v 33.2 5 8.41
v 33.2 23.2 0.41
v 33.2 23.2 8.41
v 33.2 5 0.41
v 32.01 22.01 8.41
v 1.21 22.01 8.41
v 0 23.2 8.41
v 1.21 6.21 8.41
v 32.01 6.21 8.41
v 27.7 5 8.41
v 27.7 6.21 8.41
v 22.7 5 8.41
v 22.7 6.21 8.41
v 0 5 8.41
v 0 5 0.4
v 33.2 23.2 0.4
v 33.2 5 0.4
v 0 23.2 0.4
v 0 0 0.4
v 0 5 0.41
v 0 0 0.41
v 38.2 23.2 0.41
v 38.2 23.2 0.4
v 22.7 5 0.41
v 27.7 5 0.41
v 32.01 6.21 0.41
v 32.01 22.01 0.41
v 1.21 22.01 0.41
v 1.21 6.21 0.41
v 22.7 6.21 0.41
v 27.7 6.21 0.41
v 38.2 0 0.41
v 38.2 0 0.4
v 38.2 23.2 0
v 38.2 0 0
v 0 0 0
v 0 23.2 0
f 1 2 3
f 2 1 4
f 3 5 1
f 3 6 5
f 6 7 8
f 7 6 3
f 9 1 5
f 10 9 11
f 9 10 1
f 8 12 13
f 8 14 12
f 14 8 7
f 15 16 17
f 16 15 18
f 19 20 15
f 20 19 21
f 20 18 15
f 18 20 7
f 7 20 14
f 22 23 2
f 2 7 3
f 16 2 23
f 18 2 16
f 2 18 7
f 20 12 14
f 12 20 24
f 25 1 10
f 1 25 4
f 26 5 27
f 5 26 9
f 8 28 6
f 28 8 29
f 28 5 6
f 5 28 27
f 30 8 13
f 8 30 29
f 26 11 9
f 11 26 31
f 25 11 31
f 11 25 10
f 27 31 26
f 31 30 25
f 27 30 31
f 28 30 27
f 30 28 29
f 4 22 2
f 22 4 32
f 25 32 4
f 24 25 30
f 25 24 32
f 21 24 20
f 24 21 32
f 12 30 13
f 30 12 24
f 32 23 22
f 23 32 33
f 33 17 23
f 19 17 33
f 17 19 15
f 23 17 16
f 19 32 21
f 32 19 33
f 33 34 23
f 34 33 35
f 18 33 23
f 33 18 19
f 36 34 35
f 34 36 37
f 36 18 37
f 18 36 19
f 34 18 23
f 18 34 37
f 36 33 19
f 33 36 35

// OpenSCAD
// file: ../../Base/Rotation.scad
// Fischertechnik Box Foundation
// Geometry Helpers Rotation

include <PlacementOptions.scad>

// getRotatedSpace(space, rotation=NoRotation)
// Rotates the space dependent on the specified rotation

function getRotatedSpace(space, rotation=NoRotation) = [
    (rotation == Rotate90 || rotation == Rotate270) ? space.y : space.x,
    (rotation == Rotate90 || rotation == Rotate270) ? space.x : space.y
];

// Rotates the given space around the fixed left lower corner
// space = the space the children needs as width/depth list [width,depth]
// rotation = 0 Rotate0 degrees, 1 Rotate90 degrees, 2 Rotate180 degrees, 3 Rotate270 degrees (equivalent to -90)

module RotateFix(space, rotation=NoRotation) {
    dy = (rotation == Rotate0 || rotation == Rotate270) ? 0 :
        (rotation == Rotate90) ? space.x :
        space.y;
    dx = (rotation < Rotate180) ? 0 :
        (rotation == Rotate180) ? space.x :
        space.y;
    
    translate([dx, dy, 0])
        rotate([0, 0, rotations[rotation]])
            children();
}
// file: ../../Base/Alignment.scad
// Fischertechnik Box Foundation
// Geometry Helpers Alignment

include <PlacementOptions.scad>

// getAlignedX(elementWidth, spaceWidth, align=AlignRight, offset=0)
// Gets the aligned X offset of an element with the given
// width in the given space.
// elementWidth = The width of the element to positon
// spaceWidth = The space where the element should be aligned
// align = 0 AlignLeft, 1 AlignCenter, 2 AlignRight
// offset = an optional offset from the aligned position. When
// aligned left or centered, then positive values are in X direction.
// When aligned right then positive values are in negative X direction.

function getAlignedX(elementWidth, spaceWidth, align=AlignRight, offset=0) =
    (align == AlignLeft) ?
        offset :
        ((align == AlignCenter) ?
        (spaceWidth - elementWidth)/2 + offset :
        spaceWidth - offset - elementWidth);

// getAlignedY(elementDepth, spaceDepth, align=AlignTop, offset=0)
// Gets the aligned Y offset of an element with the given
// depth in the given space.
// elementDepth = The depth of the element to positon
// spaceDepth = The space where the element should be aligned
// align = 0 AlignBottom, 1 AlignCenter, 2 AlignTop
// offset = an optional offset from the aligned position. When
// aligned bottom or centered, then positive values are in Y direction.
// When aligned top then positive values are in negative Y direction.

function getAlignedY(elementDepth, spaceDepth, align=AlignTop, offset=0) =
    (align == AlignBottom) ?
        offset :
        ((align == AlignCenter) ?
        (spaceDepth - elementDepth)/2 + offset :
        spaceDepth - offset - elementDepth);
// file: ../../Base/PlacementOptions.scad
// Fischertechnik Box Foundation
// Placement Options

// Alignment
NoAlign = 0;
AlignLeft = 1;
AlignBottom = 2;
AlignCenter = 3;
AlignRight = 4;
AlignTop = 5;

// Element rotation degree steps
rotations = [0, -90, -180, -270];

// Rotation
NoRotation = 0;
Rotate0 = 0;
Rotate90 = 1;
Rotate180 = 2;
Rotate270 = 3;

// Docking (seen from above)
NoDock = -1;
DockLeft = 0;
DockTop = 1;
DockRight = 2;
DockCorner = 2;
DockBottom = 3;

// Web corners
LowerLeft = 0;
UpperLeft = 1;
UpperRight = 2;
LowerRight = 3;

// Web position relative to corner
LeftOfCorner = 0;
RightOfCorner = 1;
// file: ../../Base/Boxes.scad
// Fischertechnik Box Foundation
// Pre-designed Boxes

use <Constants.scad>

include <PlacementOptions.scad>

box190Width = 190;
box190Depth = 130;
box130Width = 130;
box130Depth = 95;

// Values are from an original ec3 box
topBottomDifference = 1.5;
outerHeight = 40;
innerHeight = 38.2;
baseThickness = outerHeight - innerHeight;
stackExcess = 5.7;
radius = 3.5;
wallThickness = 1.5;
tolerance = 0.2;
stackOffset = innerHeight - stackExcess;

boxUsageHeight = stackOffset;
boxWallThickness = wallThickness;
boxBaseThickness = baseThickness;
boxWebWidth = 3.0;

// getBoxWallThickness()
// Gets the wall thickness of a Fischertechnik Box
function getBoxWallThickness() = boxWallThickness;

// getBoxUsageHeight()
// Gets the usable height of a Fischertechnik box
function getBoxUsageHeight() = boxUsageHeight;

// getBoxInnerHeight()
// Gets the inner height of a Fischertechnik box, including the stack excess
function getBoxInnerHeight() = innerHeight;

// getBoxBaseThickness()
// Gets the thickness of the Fischertechnik box base.
function getBoxBaseThickness() = boxBaseThickness;

// getBoxWebWidth()
// Gets the width of a box web
function getBoxWebWidth() = boxWebWidth;

// getBox190Space()
// Gets the usable inner space of a Box 190 as an x/y-list
function getBox190Space() = [
    box190Width - 2*getBoxWallThickness() - topBottomDifference, 
    box190Depth - 2*getBoxWallThickness() - topBottomDifference ];

// BoxBase(width, depth)
// Creates an empty stackable Fischertechnik compatible box
// width = Outer width of the box (190, 130, ...)
// depth = Outer depth of the box (130, 95, ...)

module BoxBase(width, depth, height=outerHeight) {    
    thinPlate = 0.01;

    innerHeight = height - baseThickness;    
    
    module BodyPlate(width, depth) {
        translate([radius, radius])
        hull() {
            w = width-2*radius;
            d = depth-2*radius;
            cube([w, d, thinPlate]);
            cylinder(thinPlate, r=radius, $fn=getFragments());
            translate([w, 0])
                cylinder(thinPlate, r=radius, $fn=getFragments());
            translate([w, d])
                cylinder(thinPlate, r=radius, $fn=getFragments());
            translate([0, d])
                cylinder(thinPlate, r=radius, $fn=getFragments());
        }
    }
    
    module Body(tolerance=tolerance) {
        hull() {
            // Bottom with tolerance to fit into the original boxes when stacked
            translate([-wallThickness+tolerance, -wallThickness+tolerance, -baseThickness])
                BodyPlate(width-topBottomDifference-2*tolerance, depth-topBottomDifference-2*tolerance);
            
            // Top
            translate([-wallThickness-topBottomDifference/2, -wallThickness-topBottomDifference/2, innerHeight-thinPlate])
                BodyPlate(width, depth);
         }
    }

    module Cutoff() {
        hull() {
            coWidth = width - 2*wallThickness;
            coDepth = depth - 2*wallThickness;
            
            // Bottom
            BodyPlate(coWidth-topBottomDifference, coDepth-topBottomDifference);

            // Top
            translate([-topBottomDifference/2, -topBottomDifference/2, innerHeight+thinPlate]) 
                BodyPlate(coWidth, coDepth);
        }
    }
    
    difference() {        
        Body();
        Cutoff();
        stackOffset = innerHeight - stackExcess;
        translate([0, 0, stackOffset + baseThickness])
            Body(tolerance=0);
    }
}

// Creates the Fischertechnik empty box 130x190 mm and places it at position 0,0
// 190x130 are the outer sizes, the inner space is slightly smaller. Use getBox190Space() to get the inner sizes.
// The box is positioned that the usable inner space is at the 0,0,0 position. The

module Box190() {
    BoxBase(box190Width, box190Depth);
}

// Gets the usable inner space of a Box 130 as an x/y-list
function getBox130Space() = [
    box130Width - 2*getBoxWallThickness() - topBottomDifference, 
    box130Depth - 2*getBoxWallThickness() - topBottomDifference ];

// Creates the Fischertechnik empty box 95x130 mm and places it at position 0,0
// 190x130 are the outer sizes, the inner space is slightly smaller. Use getBox190Space() to get the inner sizes.
// The box is positioned that the usable inner space is at the 0,0,0 position. The

module Box130() {
    BoxBase(box130Width, box130Depth);
}

// Creates a web at the specified box walls
// corner 0 = LowerLeft, 1 = UpperLeft, 2 = UpperRight, 3 = LowerRight
// side 0 = LeftOfCorner, 1 = RightOfCorner
// distance = Distance in mm from the corner
// boxSpace = inner width and depth of the box (default: Box 190)
// webWidth = length of the web (default is 3 mms)
// webThickness = thickness of the web (default is 1 mm)

module BoxWeb(corner, side, distance, boxSpace=getBox190Space(), webWidth=getBoxWebWidth(), webThickness=1.0) {
    sink = getBoxWallThickness()/2;

    width = (corner % 2 == 0) ? 
            (side == LeftOfCorner ? webWidth : webThickness) :
            (side == LeftOfCorner ? webThickness : webWidth);

    depth = (corner % 2 == 0) ? 
            (side == RightOfCorner ? webWidth : webThickness) :
            (side == RightOfCorner ? webThickness : webWidth);
    
    xDiff = corner == LowerLeft ? 
                (side == LeftOfCorner ? -sink : distance) :
            (corner == UpperLeft ?                
                (side == LeftOfCorner ? distance : -sink) :
            (corner == UpperRight ?
                (side == LeftOfCorner ? boxSpace.x-webWidth+sink : boxSpace.x-distance-webThickness) :
                (side == LeftOfCorner ? boxSpace.x-distance-webThickness: boxSpace.x-webWidth+sink)));

    yDiff = corner == LowerLeft ? 
                (side == RightOfCorner ? -sink : distance) :
            (corner == UpperLeft ?
                (side == RightOfCorner ? boxSpace.y-distance : boxSpace.y-webWidth+sink) :
            (corner == UpperRight ?
                (side == RightOfCorner ? boxSpace.y-webWidth+sink : boxSpace.y-distance) :
                (side == RightOfCorner ? distance : -sink)));
    
    translate([xDiff, yDiff, -getExcess()])
        cube([width, depth, boxUsageHeight + 2*getExcess()]);
}
// file: ../../Base/Placement.scad
// Fischertechnik Box Foundation
// Geometry Helpers Placement

use <Constants.scad>
use <Alignment.scad>
use <Rotation.scad>
use <Boxes.scad>

include <PlacementOptions.scad>

// Place(x=0, y=0, elementSpace=[0,0], alignX=AlignLeft, alignY=AlignBottom, rotation=Rotate0, boxSpace=getBox190Space())
// Places the child at the specified position
// y = Y-Position. This is a relative position when an X aligment is specified.
// x = X-Position. This is a relative position when an Y aligment is specified.
// elementSpace = space of the element to be placed [x,y]
// alignX = -1=NoAlign, 0 AlignLeft, 1 AlignCenter, 3 AlignRight (elementSpace and boxSpace required!)
// alignY = -1=NoAlign, 2 AlignBottom, 1 AlignCenter, 4 AlignTop (elementSpace and boxSpace required!)
// rotation = 0 Rotate0 0 degrees, 1 Rotate90 90 degrees, 
// 2 Rotate180 180 degrees, 3 Rotate270 270 degrees (equivalent to -90)
// boxSpace = Inner space of the box where the placement occurs [x,y] - default is Box 190x130 inner space

module Place(x=0, y=0, elementSpace=[0,0], 
  alignX=AlignLeft, alignY=AlignBottom, 
  rotation=NoRotation, boxSpace=getBox190Space()) {

    module Position(x, y, space, rotation=Rotate0) {
        translate([x, y, 0])
            RotateFix(space, rotation)
                children();
    }

    space = getRotatedSpace(elementSpace, rotation);
    alignedX = getAlignedX(space.x, boxSpace.x, alignX, x);
    alignedY = getAlignedY(space.y, boxSpace.y, alignY, y);
    Position(alignedX, alignedY, elementSpace, rotation)
        children();
}

// Center(space=getBox130Space(), elementSpace=[0,0])
// space = Space where the children is centered. For cylinder use centered=true and no elementSpace.
// elementSpace = space of the element to be centered [x,y]

module Center(space=getBox190Space(), elementSpace=[0,0]) {
    Place(elementSpace=elementSpace, boxSpace=space, alignX=AlignCenter, alignY=AlignCenter)
        children();
}

// CenterHorizontal(width=0, y=0, offset=0, space=getBox130Space())
// width = Width of the element to be placed.
// y = Y position of the element
// offset = Offset from the center position (negative will be left of the center)
// space = Space where the element is placed

module CenterHorizontal(width=0, y=0, offset=0, space=getBox190Space()) {
    Place(x=offset, y=y, elementSpace=[width, 0], boxSpace=space, alignX=AlignCenter)
        children(0);
}

// CenterVertical(depth=0, x=0, offset=0, space=getBox130Space())
// depth = Depth of the element to be placed.
// x = X position of the element
// offset = Offset from the center position (negative will be down of the center)
// space = Space where the element is placed

module CenterVertical(depth=0, x=0, offset=0, space=getBox190Space()) {
    Place(x=x, y=offset, elementSpace=[0, depth], boxSpace=space, alignY=AlignCenter)
        children(0);
}

// getIsVertical(align)
// True if the specified alignment needs a vertical orientation for a divider (AlignRight, AlignLeft)

function getIsVertical(align) = (align == AlignRight || align == AlignLeft);

// getIsHorizontal(align)
// True if the specified alignment needs a horizontal orientation for a divider (AlignTop, AlignBottom)

function getIsHorizontal(align) = (align == AlignTop || align == AlignBottom);
// file: ../../Elements/AxisClip10.scad
// Fischertechnik Box Library
// Axis for clip 10
// 31023

use <../ModelBase/Simple.scad>
use <../Base/Constants.scad>

width = 12;
depth = 12;
height = 23;
upperDiameter = 3.6;
clipHeight = 10;

// getAxisClip10Space()
// Gets the space of a frame for a clip 10 with spring ring (mot2)

function getAxisClip10Space() = [width, depth, height];

// AxisClip10(height, clipHeight)
// Axis for clip 10 with spring ring (mot2)
// height = Height of the complete axis
// clipHeight = Height of the rt for the clip (standard is 10, in mot3 its only 7)

module AxisClip10(height=height, clipHeight=clipHeight) {
    LeveledAxisWithSpace(height, height-clipHeight, getAxisClip10Space(), diameter=upperDiameter);
}

// Tests
color("lightgray")
AxisClip10();
// file: ../../Base/Constants.scad
// Fischertechnik Box Foundation
// Constants

// Constant values necessary for multiple elements

// Base constants
dividerThickness = 1.2;
excess = 0.01;
fragments = 90;
tolerance = 0.8;

// Gets the thickness of a divider 
function getDividerThickness() = dividerThickness;

// Gets the excess that is used to merge walls into each other
function getExcess() = excess;

// Gets amount of fragments of a cylinder
function getFragments() = fragments;

// Gets the inner tolerance of a frame to each side
function getTolerance() = tolerance;


// Fischertechnik specific constants
axisDiameter = 4;
axisBottomDiameter = axisDiameter + 1;
standardEdgeDistance = 2.5;
standardWebDistance = 11.5;
standardCornerLength = 15;
tubeWallFactor = 0.8;
smallPartsFrameHeight = 20;

// Gets axis diameter
function getAxisDiameter() = axisDiameter;

// Gets axis bottom diameter for thicker part at the bottom
function getAxisBottomDiameter() = axisBottomDiameter;

// gets the standard distance to the wall of the box for dockable frames with webs
function getStandardEdgeDistance() = standardEdgeDistance;

// gets the standard distance of each web to the corner of the dockable frame
function getStandardWebDistance() = standardWebDistance;

// gets the standard length of the corner walls of a dockable frame
function getStandardCornerLength() = standardCornerLength;

// gets the wall thickness of a tube.
function getTubeWallThickness() = tubeWallFactor * getDividerThickness();

// gets the frame height for docked small parts boxes.
function getSmallPartsFrameHeight() = smallPartsFrameHeight;
// file: ../../Elements/FrameLightTube.scad
// Fischertechnik Box Library
// Frame for Light Tube
// 31363

use <../Base/Constants.scad>
use <../ModelBase/Simple.scad>

width = 30;
depth = 15;
height = 8;
widthForFlap = 5;
depthForFlap = 5;

// getFrameLightTubeSpace()
// Gets the space the frame for light tube needs as width (.x and .y as a list)

function getFrameLightTubeSpace() = getFrameOuterVolume([width + widthForFlap, depth + depthForFlap, height]);

// FrameLightTube()
// Frame for light tube

module FrameLightTube() {
    gapWidth = 5;
    gapDistance = 3.5;
    Space(getFrameLightTubeSpace());
    
    translate([0, depthForFlap]) {
        difference() {
            Frame([width, depth, height]);
            translate([width-gapDistance-gapWidth+getDividerThickness(),-getDividerThickness()/2,0])
                cube([gapWidth, getDividerThickness()*2, height + 1]);
        }
    }
}

// Test
color("lightgray") {
    FrameLightTube();
}
// file: ../TestPrint.scad
// 3D Print Test Base

use <../Base/Constants.scad>

use <../Elements/AxisClip10.scad>

module TestPrint(elementSpace) {
    cube([elementSpace.x, elementSpace.y, 0.4]);
    translate([0,0,0.4+getExcess()]) {
        children();
    }
}

TestPrint(getAxisClip10Space())
    AxisClip10();
// main file
// 3D Print Test
// FrameLightTube

use <../TestPrint.scad>
use <../../Elements/FrameLightTube.scad>

TestPrint(getFrameLightTubeSpace())
    FrameLightTube();
